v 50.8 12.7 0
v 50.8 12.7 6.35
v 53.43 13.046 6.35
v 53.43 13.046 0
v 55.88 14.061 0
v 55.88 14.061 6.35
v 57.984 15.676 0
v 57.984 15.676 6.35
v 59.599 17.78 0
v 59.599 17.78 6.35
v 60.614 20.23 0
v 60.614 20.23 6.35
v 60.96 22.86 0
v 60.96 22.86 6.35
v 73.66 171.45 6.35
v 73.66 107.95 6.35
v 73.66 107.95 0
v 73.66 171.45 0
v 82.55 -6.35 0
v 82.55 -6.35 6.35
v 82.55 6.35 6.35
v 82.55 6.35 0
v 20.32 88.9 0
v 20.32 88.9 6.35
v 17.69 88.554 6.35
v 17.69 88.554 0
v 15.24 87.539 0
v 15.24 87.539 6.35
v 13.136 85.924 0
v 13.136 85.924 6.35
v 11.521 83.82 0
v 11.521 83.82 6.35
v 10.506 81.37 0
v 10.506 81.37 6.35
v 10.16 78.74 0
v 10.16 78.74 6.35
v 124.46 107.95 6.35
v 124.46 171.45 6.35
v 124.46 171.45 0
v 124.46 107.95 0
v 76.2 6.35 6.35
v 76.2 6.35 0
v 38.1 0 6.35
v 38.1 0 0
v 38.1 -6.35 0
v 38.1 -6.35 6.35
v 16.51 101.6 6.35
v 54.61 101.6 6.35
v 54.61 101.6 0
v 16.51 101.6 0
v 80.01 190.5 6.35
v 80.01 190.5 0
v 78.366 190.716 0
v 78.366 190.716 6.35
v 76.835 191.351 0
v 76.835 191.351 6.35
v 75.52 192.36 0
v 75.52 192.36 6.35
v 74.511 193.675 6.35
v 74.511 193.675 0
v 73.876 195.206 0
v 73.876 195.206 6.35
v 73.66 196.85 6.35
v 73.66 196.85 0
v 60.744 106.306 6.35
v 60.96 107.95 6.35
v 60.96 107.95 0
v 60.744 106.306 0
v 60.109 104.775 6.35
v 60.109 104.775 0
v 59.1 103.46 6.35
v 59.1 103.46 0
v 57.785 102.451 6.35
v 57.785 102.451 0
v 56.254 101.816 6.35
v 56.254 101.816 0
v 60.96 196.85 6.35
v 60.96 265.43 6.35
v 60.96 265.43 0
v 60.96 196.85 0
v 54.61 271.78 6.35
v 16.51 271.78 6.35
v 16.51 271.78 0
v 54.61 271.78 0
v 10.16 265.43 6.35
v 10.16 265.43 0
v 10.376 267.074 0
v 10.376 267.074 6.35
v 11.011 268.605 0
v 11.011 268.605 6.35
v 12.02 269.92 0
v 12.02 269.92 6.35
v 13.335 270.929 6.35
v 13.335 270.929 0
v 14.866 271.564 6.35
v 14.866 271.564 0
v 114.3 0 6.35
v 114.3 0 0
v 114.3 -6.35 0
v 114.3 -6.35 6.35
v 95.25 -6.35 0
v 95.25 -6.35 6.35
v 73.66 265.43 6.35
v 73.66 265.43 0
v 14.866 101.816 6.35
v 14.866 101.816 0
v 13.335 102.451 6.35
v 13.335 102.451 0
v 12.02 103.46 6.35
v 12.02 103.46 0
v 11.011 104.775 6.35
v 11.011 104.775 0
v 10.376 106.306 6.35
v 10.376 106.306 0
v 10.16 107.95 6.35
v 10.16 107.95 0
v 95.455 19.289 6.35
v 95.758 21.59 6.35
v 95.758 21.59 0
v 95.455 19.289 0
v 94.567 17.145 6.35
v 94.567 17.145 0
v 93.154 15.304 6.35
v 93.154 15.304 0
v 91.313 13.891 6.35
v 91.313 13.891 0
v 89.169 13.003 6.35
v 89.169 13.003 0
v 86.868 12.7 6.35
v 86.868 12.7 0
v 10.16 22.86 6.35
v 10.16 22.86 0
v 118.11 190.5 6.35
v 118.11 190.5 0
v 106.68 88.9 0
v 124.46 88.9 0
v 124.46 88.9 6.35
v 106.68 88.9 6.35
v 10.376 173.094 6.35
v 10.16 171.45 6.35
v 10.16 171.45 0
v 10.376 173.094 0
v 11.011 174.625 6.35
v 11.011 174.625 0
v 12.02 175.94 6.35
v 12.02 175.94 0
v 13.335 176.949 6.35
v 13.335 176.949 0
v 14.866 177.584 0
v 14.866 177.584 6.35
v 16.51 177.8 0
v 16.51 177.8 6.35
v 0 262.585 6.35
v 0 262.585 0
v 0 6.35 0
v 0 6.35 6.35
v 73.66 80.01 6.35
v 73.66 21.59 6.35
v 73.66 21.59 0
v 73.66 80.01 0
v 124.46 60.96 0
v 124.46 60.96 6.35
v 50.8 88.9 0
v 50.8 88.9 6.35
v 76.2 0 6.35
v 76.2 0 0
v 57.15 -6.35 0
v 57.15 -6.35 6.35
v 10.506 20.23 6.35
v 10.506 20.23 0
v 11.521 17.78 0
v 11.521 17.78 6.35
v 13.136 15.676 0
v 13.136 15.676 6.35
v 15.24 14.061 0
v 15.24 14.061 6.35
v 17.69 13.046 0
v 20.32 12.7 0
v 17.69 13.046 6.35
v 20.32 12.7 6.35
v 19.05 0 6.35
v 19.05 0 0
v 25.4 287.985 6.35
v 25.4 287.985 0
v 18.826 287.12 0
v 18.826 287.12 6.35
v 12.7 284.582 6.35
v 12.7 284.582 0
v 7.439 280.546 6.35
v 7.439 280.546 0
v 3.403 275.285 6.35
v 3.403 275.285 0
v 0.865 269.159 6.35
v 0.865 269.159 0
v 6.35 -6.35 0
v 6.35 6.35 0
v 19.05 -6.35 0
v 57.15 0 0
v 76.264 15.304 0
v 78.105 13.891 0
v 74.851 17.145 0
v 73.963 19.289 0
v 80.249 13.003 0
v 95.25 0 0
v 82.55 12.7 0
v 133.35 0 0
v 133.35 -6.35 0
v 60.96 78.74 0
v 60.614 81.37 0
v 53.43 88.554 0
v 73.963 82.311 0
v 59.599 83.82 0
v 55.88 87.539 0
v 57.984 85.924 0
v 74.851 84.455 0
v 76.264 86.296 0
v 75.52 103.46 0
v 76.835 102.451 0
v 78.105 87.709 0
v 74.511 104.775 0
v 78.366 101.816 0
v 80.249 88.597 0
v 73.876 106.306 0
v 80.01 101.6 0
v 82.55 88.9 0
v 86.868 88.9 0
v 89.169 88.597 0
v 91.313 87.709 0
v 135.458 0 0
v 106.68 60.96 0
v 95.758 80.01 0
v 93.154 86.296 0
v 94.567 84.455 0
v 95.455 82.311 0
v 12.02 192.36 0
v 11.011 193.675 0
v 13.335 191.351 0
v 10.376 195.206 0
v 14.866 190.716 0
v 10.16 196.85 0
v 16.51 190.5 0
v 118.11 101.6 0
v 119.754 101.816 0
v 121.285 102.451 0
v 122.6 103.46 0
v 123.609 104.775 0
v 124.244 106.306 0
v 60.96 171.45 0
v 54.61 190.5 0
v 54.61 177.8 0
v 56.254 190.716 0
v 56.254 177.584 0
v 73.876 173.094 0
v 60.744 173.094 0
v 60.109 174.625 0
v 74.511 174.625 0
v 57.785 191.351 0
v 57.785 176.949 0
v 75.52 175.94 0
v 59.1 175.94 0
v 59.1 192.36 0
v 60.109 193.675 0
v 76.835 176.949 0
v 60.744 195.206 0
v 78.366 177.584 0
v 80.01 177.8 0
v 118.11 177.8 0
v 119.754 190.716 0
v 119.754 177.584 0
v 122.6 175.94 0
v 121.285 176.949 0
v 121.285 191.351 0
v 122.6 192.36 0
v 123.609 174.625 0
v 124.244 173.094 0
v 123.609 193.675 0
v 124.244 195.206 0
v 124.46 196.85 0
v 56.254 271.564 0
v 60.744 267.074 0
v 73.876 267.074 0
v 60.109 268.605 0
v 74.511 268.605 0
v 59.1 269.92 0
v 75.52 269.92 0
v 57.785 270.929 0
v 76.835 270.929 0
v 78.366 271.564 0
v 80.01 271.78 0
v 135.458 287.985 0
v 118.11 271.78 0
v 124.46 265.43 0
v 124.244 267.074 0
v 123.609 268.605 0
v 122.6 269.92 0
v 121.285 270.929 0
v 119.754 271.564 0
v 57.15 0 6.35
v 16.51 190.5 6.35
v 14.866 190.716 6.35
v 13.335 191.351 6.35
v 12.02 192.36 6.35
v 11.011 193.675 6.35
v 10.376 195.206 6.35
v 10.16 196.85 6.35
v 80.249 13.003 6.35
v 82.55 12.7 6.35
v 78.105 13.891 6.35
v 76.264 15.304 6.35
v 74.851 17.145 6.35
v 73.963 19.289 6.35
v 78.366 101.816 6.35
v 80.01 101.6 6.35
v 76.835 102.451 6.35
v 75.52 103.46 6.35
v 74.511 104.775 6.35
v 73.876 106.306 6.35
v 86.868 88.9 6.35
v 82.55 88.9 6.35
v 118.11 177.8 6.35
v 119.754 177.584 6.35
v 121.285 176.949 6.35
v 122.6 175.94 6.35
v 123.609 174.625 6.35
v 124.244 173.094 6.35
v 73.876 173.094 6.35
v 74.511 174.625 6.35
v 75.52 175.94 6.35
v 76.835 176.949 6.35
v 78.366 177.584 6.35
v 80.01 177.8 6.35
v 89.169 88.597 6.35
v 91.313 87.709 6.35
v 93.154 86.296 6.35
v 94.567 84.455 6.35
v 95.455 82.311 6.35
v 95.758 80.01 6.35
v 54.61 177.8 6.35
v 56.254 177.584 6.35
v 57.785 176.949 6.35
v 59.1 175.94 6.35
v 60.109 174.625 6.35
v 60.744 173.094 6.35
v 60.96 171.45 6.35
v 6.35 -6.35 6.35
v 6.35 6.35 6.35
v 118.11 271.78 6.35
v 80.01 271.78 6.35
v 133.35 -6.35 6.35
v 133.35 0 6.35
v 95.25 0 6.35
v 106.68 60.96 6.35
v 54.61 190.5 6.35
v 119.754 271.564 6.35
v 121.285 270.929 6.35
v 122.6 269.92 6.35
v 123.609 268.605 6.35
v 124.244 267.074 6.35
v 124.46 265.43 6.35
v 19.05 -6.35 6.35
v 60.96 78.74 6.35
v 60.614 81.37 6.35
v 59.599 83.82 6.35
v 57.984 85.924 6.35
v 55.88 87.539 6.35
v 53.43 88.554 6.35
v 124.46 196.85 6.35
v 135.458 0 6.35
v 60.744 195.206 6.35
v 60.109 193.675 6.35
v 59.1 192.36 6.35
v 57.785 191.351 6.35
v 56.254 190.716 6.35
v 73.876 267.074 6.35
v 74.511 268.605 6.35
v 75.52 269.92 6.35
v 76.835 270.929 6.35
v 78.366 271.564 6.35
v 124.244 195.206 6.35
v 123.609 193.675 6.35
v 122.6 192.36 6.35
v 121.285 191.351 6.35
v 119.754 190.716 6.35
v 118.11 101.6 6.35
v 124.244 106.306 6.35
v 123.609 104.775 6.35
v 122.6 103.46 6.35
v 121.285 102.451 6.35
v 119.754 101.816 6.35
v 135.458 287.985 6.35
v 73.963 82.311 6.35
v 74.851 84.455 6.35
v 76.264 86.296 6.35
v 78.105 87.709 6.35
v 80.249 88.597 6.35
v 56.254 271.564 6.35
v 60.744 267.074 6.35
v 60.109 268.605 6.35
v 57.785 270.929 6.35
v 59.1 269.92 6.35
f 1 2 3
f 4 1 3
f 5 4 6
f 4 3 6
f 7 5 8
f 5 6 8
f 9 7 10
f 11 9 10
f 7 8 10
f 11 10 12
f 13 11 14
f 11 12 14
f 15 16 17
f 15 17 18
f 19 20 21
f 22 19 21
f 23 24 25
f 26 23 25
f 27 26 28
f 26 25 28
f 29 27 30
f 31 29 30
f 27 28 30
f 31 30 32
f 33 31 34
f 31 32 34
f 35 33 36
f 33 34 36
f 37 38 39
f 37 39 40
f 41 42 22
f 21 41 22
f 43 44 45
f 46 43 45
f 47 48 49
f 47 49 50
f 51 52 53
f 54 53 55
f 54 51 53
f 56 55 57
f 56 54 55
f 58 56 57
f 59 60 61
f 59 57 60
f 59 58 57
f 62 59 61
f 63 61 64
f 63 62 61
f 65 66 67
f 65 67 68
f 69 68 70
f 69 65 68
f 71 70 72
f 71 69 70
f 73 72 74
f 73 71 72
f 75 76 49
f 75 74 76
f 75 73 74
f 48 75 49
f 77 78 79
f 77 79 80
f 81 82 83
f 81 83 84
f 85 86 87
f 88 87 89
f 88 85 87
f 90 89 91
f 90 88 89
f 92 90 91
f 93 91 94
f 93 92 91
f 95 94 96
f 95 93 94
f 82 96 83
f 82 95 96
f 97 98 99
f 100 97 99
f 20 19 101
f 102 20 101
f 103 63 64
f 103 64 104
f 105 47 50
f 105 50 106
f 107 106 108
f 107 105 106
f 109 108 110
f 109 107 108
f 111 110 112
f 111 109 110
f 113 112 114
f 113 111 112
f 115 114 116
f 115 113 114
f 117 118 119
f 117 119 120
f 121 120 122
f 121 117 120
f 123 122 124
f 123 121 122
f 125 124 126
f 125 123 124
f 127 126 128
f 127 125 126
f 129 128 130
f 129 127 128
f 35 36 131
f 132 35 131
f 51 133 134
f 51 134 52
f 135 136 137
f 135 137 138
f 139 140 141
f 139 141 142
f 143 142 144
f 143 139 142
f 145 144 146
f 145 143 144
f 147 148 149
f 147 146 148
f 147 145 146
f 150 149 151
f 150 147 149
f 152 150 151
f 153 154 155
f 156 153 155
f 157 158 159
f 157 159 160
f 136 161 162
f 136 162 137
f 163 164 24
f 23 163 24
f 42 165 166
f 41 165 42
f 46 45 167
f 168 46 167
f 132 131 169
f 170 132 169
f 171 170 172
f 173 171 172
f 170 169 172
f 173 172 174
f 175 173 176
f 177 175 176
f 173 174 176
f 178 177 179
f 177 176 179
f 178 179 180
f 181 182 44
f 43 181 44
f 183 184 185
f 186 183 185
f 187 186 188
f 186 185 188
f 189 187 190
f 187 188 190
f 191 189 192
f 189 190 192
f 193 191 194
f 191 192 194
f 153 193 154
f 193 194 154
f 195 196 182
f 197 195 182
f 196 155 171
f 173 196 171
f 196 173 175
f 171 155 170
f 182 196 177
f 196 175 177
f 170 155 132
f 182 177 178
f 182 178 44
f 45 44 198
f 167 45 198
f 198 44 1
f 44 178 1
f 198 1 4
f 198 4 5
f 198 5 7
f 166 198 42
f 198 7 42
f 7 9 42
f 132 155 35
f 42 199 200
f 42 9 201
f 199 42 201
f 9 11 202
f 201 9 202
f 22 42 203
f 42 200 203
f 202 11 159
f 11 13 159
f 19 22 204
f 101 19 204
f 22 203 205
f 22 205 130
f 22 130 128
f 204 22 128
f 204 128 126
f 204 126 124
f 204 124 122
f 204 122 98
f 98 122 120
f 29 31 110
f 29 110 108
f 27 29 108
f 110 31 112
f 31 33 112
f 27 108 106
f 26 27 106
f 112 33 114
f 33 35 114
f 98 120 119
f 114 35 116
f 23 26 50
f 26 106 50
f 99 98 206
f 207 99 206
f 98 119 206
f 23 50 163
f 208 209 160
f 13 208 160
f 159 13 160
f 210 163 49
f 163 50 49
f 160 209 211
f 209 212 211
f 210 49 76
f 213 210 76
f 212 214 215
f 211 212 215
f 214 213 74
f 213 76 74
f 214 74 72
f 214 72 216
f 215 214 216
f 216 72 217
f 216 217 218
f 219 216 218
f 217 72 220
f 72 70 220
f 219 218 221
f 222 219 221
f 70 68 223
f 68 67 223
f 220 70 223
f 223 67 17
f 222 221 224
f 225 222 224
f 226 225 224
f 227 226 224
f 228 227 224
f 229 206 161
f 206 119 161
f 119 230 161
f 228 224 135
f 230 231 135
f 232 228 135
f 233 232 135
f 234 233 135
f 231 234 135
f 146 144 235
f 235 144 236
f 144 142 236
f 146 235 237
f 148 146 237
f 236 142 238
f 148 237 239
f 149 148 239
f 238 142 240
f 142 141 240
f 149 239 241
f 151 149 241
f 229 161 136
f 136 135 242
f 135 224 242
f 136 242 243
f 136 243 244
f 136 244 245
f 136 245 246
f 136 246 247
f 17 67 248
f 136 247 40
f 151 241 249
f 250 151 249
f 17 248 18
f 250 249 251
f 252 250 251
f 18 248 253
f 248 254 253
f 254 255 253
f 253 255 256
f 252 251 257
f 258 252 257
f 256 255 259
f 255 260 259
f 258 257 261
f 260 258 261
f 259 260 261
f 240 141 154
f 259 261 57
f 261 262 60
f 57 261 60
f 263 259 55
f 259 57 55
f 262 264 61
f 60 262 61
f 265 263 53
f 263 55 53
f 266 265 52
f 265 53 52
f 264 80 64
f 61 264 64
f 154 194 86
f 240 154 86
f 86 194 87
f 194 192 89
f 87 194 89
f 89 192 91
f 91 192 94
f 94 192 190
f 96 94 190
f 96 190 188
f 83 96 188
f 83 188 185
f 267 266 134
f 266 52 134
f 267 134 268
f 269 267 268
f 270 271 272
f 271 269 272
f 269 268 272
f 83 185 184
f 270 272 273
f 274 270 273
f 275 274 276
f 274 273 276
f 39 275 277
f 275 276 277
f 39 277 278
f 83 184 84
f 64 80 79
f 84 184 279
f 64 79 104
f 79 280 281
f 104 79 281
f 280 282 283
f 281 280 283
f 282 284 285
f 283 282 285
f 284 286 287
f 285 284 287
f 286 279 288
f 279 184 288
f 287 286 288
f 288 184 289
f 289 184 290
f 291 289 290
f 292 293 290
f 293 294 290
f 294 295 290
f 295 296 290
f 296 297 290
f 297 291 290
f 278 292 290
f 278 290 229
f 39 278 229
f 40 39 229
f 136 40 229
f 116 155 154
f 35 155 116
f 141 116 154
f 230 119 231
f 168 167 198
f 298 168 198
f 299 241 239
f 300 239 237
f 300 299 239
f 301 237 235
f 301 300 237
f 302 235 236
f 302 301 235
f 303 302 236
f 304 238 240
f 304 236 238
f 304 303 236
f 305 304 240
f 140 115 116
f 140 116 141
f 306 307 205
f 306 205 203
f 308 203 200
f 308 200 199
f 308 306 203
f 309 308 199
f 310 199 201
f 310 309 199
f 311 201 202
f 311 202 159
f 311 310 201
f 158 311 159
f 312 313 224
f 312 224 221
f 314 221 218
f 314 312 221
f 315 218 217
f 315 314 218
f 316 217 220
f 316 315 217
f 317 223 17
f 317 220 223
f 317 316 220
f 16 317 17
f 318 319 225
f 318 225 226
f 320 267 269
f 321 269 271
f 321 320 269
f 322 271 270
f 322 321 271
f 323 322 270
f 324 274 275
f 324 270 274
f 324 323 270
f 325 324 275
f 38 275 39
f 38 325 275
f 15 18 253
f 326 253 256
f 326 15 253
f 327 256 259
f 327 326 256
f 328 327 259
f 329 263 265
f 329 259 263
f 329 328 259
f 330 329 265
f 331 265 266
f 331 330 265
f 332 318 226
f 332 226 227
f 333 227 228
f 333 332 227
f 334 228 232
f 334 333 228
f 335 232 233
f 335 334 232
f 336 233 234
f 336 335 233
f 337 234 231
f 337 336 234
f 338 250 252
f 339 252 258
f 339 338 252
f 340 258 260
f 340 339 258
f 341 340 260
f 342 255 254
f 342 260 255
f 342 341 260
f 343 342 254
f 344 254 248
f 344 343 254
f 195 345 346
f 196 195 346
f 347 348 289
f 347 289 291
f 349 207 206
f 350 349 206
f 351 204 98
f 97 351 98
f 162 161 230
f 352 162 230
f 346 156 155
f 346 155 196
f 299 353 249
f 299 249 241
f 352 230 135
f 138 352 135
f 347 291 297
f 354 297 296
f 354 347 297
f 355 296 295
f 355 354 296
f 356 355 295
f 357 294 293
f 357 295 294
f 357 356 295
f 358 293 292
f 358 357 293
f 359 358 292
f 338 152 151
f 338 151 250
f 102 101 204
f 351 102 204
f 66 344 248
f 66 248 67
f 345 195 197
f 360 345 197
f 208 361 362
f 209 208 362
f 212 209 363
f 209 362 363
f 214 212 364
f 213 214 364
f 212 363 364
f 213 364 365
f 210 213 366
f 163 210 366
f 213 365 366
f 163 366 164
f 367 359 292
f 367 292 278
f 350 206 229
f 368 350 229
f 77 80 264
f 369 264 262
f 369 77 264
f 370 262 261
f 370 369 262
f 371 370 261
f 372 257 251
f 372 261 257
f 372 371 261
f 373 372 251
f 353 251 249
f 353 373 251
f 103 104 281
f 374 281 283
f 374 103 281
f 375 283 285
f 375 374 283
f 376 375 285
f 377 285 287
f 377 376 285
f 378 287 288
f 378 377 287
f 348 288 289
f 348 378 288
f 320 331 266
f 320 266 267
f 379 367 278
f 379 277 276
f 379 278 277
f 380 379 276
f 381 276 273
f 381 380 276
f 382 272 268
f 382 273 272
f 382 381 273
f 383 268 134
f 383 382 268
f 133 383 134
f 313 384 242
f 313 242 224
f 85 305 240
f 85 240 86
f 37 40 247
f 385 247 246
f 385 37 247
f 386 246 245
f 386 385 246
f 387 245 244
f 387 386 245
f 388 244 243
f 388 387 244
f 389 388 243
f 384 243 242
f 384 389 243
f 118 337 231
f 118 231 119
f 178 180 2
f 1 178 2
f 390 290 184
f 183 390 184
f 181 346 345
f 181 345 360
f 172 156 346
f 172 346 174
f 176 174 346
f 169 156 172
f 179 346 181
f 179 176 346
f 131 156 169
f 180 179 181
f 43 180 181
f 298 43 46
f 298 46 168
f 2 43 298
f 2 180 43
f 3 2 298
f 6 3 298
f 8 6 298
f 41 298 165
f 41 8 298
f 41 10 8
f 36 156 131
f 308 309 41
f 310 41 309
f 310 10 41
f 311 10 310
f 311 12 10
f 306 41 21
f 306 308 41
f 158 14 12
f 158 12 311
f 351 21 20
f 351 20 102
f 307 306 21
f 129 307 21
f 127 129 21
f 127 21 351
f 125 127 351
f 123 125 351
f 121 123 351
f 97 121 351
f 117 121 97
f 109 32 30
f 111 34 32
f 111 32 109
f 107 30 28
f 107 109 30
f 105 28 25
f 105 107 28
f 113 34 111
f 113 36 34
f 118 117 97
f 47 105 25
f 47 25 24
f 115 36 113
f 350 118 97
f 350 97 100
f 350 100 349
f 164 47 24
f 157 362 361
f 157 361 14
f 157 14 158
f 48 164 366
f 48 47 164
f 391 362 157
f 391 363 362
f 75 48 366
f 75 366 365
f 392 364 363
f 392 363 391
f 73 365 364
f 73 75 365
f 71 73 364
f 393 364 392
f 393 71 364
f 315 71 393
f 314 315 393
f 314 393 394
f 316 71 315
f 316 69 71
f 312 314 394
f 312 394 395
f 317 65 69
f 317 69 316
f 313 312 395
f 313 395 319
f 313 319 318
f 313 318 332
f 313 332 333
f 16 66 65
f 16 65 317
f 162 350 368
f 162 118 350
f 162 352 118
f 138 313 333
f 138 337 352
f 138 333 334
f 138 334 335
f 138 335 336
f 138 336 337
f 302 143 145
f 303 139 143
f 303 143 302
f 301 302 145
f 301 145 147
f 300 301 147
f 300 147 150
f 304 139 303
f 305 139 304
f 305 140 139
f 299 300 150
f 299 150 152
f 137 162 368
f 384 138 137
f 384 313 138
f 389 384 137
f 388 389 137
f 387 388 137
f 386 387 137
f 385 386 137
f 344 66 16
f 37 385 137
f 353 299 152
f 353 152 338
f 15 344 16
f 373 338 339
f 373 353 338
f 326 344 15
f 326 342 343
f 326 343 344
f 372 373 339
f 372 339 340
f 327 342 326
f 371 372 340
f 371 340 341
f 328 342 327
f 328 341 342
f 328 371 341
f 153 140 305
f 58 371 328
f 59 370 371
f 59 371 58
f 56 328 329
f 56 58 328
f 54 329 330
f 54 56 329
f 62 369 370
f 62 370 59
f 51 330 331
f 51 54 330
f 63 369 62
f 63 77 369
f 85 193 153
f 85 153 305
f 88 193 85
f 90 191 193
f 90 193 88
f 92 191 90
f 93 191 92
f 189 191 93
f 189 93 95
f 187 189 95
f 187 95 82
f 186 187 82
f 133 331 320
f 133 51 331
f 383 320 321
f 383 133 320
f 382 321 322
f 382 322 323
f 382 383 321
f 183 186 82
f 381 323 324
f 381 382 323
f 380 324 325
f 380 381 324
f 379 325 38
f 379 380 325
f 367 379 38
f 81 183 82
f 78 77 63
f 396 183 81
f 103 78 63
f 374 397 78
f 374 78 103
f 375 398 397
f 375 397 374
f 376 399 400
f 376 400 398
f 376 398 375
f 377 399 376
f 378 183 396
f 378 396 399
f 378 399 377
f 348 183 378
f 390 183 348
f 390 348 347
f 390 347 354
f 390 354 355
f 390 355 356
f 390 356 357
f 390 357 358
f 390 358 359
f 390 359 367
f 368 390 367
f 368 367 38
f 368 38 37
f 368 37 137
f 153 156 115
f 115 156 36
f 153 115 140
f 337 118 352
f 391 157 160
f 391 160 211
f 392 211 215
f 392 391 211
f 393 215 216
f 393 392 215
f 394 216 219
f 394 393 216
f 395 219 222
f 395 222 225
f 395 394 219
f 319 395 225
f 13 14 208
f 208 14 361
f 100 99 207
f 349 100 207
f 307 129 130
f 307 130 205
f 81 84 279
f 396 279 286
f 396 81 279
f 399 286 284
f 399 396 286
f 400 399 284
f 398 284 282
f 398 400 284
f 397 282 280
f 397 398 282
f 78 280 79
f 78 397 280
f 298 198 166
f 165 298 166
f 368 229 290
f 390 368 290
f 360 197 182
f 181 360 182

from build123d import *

# Parameters (mm, degrees)
BOSS_EXTRUDE1_DEPTH = 6.35
CUT_EXTRUDE1_DEPTH  = 319.315227787
SKETCH3_W           = 6.35
SKETCH3_H           = 12.7
CUT_EXTRUDE2_DEPTH  = 319.315227787
SKETCH4_W           = 58.894470958
SKETCH4_H           = 80.433020337
BOSS_EXTRUDE3_DEPTH = 6.35
SKETCH6_W           = 17.78
SKETCH6_H           = 27.94
CUT_EXTRUDE3_DEPTH  = 319.315227787
CUT_EXTRUDE4_DEPTH  = 6.35


with BuildPart() as part:
    # Sketch1 → Boss-Extrude1 (new body)
    with BuildSketch(Plane.XY):
        with BuildLine():
            Line((133.35, 0), (135.457692, 0))
            Line((135.457692, 0), (135.457692, 287.9852))
            Line((135.457692, 287.9852), (25.4, 287.9852))
            ThreePointArc((25.4, 287.9852), (7.439487758, 280.545712242), (0, 262.5852))
            Line((0, 262.5852), (0, 0))
            Line((0, 0), (0, -6.35))
            Line((0, -6.35), (19.05, -6.35))
            Line((19.05, -6.35), (19.05, 0))
            Line((19.05, 0), (38.1, 0))
            Line((38.1, 0), (38.1, -6.35))
            Line((38.1, -6.35), (57.15, -6.35))
            Line((57.15, -6.35), (57.15, 0))
            Line((57.15, 0), (76.2, 0))
            Line((76.2, 0), (76.2, -6.35))
            Line((76.2, -6.35), (95.25, -6.35))
            Line((95.25, -6.35), (95.25, 0))
            Line((95.25, 0), (114.3, 0))
            Line((114.3, 0), (114.3, -6.35))
            Line((114.3, -6.35), (133.35, -6.35))
            Line((133.35, -6.35), (133.35, 0))
        make_face()
    extrude(amount=BOSS_EXTRUDE1_DEPTH)

    # Sketch2 → Cut-Extrude1 (cut, through all)
    with BuildSketch(Plane.XY.offset(6.35)):
        with BuildLine():
            Line((73.66, 22.86), (73.66, 78.74))
            ThreePointArc((73.66, 78.74), (76.635795103, 85.924204897), (83.82, 88.9))
            Line((83.82, 88.9), (114.3, 88.9))
            ThreePointArc((114.3, 88.9), (121.484204897, 85.924204897), (124.46, 78.74))
            Line((124.46, 78.74), (124.46, 22.86))
            ThreePointArc((124.46, 22.86), (121.484204897, 15.675795103), (114.3, 12.7))
            Line((114.3, 12.7), (83.82, 12.7))
            ThreePointArc((83.82, 12.7), (76.635795103, 15.675795103), (73.66, 22.86))
        make_face()
        with BuildLine():
            Line((20.32, 12.7), (50.8, 12.7))
            ThreePointArc((50.8, 12.7), (57.984204897, 15.675795103), (60.96, 22.86))
            Line((60.96, 22.86), (60.96, 78.74))
            ThreePointArc((60.96, 78.74), (57.984204897, 85.924204897), (50.8, 88.9))
            Line((50.8, 88.9), (20.32, 88.9))
            ThreePointArc((20.32, 88.9), (13.135795103, 85.924204897), (10.16, 78.74))
            Line((10.16, 78.74), (10.16, 22.86))
            ThreePointArc((10.16, 22.86), (13.135795103, 15.675795103), (20.32, 12.7))
        make_face()
        with BuildLine():
            Line((73.66, 196.85), (73.66, 265.43))
            ThreePointArc((73.66, 265.43), (75.519871939, 269.920128061), (80.01, 271.78))
            Line((80.01, 271.78), (118.11, 271.78))
            ThreePointArc((118.11, 271.78), (122.600128061, 269.920128061), (124.46, 265.43))
            Line((124.46, 265.43), (124.46, 196.85))
            ThreePointArc((124.46, 196.85), (122.600128061, 192.359871939), (118.11, 190.5))
            Line((118.11, 190.5), (80.01, 190.5))
            ThreePointArc((80.01, 190.5), (75.519871939, 192.359871939), (73.66, 196.85))
        make_face()
        with BuildLine():
            Line((10.16, 196.85), (10.16, 265.43))
            ThreePointArc((10.16, 265.43), (12.019871939, 269.920128061), (16.51, 271.78))
            Line((16.51, 271.78), (54.61, 271.78))
            ThreePointArc((54.61, 271.78), (59.100128061, 269.920128061), (60.96, 265.43))
            Line((60.96, 265.43), (60.96, 196.85))
            ThreePointArc((60.96, 196.85), (59.100128061, 192.359871939), (54.61, 190.5))
            Line((54.61, 190.5), (16.51, 190.5))
            ThreePointArc((16.51, 190.5), (12.019871939, 192.359871939), (10.16, 196.85))
        make_face()
        with BuildLine():
            Line((73.66, 107.95), (73.66, 171.45))
            ThreePointArc((73.66, 171.45), (75.519871939, 175.940128061), (80.01, 177.8))
            Line((80.01, 177.8), (118.11, 177.8))
            ThreePointArc((118.11, 177.8), (122.600128061, 175.940128061), (124.46, 171.45))
            Line((124.46, 171.45), (124.46, 107.95))
            ThreePointArc((124.46, 107.95), (122.600128061, 103.459871939), (118.11, 101.6))
            Line((118.11, 101.6), (80.01, 101.6))
            ThreePointArc((80.01, 101.6), (75.519871939, 103.459871939), (73.66, 107.95))
        make_face()
        with BuildLine():
            Line((10.16, 107.95), (10.16, 171.45))
            ThreePointArc((10.16, 171.45), (12.019871939, 175.940128061), (16.51, 177.8))
            Line((16.51, 177.8), (54.61, 177.8))
            ThreePointArc((54.61, 177.8), (59.100128061, 175.940128061), (60.96, 171.45))
            Line((60.96, 171.45), (60.96, 107.95))
            ThreePointArc((60.96, 107.95), (59.100128061, 103.459871939), (54.61, 101.6))
            Line((54.61, 101.6), (16.51, 101.6))
            ThreePointArc((16.51, 101.6), (12.019871939, 103.459871939), (10.16, 107.95))
        make_face()
    extrude(amount=-CUT_EXTRUDE1_DEPTH, mode=Mode.SUBTRACT)

    # Sketch3 → Cut-Extrude2 (cut, through all)
    with BuildSketch(Plane.XY.offset(6.35)):
        with Locations((3.175, 0)):
            Rectangle(SKETCH3_W, SKETCH3_H)
        with Locations((79.375, 0)):
            Rectangle(SKETCH3_W, SKETCH3_H)
    extrude(amount=-CUT_EXTRUDE2_DEPTH, mode=Mode.SUBTRACT)

    # Sketch4 → Boss-Extrude3 (add)
    with BuildSketch(Plane.XY.offset(6.35)):
        with Locations((98.603069985, 49.657450477)):
            Rectangle(SKETCH4_W, SKETCH4_H)
    extrude(amount=-BOSS_EXTRUDE3_DEPTH)

    # Sketch6 → Cut-Extrude3 (cut, through all)
    with BuildSketch(Plane(origin=(0, 0, 0), x_dir=(-1, 0, 0), z_dir=(0, 0, -1))):
        with Locations((-115.57, 74.93)):
            Rectangle(SKETCH6_W, SKETCH6_H)
    extrude(amount=-CUT_EXTRUDE3_DEPTH, mode=Mode.SUBTRACT)

    # Sketch7 → Cut-Extrude4 (cut)
    with BuildSketch(Plane.XY.offset(6.35)):
        with BuildLine():
            Line((82.55, 88.9), (86.868, 88.9))
            ThreePointArc((86.868, 88.9), (93.154179285, 86.296179285), (95.758, 80.01))
            Line((95.758, 80.01), (95.758, 21.59))
            ThreePointArc((95.758, 21.59), (93.154179285, 15.303820715), (86.868, 12.7))
            Line((86.868, 12.7), (82.55, 12.7))
            ThreePointArc((82.55, 12.7), (76.263820715, 15.303820715), (73.66, 21.59))
            Line((73.66, 21.59), (73.66, 80.01))
            ThreePointArc((73.66, 80.01), (76.263820715, 86.296179285), (82.55, 88.9))
        make_face()
    extrude(amount=-CUT_EXTRUDE4_DEPTH, mode=Mode.SUBTRACT)


solid = part.part
